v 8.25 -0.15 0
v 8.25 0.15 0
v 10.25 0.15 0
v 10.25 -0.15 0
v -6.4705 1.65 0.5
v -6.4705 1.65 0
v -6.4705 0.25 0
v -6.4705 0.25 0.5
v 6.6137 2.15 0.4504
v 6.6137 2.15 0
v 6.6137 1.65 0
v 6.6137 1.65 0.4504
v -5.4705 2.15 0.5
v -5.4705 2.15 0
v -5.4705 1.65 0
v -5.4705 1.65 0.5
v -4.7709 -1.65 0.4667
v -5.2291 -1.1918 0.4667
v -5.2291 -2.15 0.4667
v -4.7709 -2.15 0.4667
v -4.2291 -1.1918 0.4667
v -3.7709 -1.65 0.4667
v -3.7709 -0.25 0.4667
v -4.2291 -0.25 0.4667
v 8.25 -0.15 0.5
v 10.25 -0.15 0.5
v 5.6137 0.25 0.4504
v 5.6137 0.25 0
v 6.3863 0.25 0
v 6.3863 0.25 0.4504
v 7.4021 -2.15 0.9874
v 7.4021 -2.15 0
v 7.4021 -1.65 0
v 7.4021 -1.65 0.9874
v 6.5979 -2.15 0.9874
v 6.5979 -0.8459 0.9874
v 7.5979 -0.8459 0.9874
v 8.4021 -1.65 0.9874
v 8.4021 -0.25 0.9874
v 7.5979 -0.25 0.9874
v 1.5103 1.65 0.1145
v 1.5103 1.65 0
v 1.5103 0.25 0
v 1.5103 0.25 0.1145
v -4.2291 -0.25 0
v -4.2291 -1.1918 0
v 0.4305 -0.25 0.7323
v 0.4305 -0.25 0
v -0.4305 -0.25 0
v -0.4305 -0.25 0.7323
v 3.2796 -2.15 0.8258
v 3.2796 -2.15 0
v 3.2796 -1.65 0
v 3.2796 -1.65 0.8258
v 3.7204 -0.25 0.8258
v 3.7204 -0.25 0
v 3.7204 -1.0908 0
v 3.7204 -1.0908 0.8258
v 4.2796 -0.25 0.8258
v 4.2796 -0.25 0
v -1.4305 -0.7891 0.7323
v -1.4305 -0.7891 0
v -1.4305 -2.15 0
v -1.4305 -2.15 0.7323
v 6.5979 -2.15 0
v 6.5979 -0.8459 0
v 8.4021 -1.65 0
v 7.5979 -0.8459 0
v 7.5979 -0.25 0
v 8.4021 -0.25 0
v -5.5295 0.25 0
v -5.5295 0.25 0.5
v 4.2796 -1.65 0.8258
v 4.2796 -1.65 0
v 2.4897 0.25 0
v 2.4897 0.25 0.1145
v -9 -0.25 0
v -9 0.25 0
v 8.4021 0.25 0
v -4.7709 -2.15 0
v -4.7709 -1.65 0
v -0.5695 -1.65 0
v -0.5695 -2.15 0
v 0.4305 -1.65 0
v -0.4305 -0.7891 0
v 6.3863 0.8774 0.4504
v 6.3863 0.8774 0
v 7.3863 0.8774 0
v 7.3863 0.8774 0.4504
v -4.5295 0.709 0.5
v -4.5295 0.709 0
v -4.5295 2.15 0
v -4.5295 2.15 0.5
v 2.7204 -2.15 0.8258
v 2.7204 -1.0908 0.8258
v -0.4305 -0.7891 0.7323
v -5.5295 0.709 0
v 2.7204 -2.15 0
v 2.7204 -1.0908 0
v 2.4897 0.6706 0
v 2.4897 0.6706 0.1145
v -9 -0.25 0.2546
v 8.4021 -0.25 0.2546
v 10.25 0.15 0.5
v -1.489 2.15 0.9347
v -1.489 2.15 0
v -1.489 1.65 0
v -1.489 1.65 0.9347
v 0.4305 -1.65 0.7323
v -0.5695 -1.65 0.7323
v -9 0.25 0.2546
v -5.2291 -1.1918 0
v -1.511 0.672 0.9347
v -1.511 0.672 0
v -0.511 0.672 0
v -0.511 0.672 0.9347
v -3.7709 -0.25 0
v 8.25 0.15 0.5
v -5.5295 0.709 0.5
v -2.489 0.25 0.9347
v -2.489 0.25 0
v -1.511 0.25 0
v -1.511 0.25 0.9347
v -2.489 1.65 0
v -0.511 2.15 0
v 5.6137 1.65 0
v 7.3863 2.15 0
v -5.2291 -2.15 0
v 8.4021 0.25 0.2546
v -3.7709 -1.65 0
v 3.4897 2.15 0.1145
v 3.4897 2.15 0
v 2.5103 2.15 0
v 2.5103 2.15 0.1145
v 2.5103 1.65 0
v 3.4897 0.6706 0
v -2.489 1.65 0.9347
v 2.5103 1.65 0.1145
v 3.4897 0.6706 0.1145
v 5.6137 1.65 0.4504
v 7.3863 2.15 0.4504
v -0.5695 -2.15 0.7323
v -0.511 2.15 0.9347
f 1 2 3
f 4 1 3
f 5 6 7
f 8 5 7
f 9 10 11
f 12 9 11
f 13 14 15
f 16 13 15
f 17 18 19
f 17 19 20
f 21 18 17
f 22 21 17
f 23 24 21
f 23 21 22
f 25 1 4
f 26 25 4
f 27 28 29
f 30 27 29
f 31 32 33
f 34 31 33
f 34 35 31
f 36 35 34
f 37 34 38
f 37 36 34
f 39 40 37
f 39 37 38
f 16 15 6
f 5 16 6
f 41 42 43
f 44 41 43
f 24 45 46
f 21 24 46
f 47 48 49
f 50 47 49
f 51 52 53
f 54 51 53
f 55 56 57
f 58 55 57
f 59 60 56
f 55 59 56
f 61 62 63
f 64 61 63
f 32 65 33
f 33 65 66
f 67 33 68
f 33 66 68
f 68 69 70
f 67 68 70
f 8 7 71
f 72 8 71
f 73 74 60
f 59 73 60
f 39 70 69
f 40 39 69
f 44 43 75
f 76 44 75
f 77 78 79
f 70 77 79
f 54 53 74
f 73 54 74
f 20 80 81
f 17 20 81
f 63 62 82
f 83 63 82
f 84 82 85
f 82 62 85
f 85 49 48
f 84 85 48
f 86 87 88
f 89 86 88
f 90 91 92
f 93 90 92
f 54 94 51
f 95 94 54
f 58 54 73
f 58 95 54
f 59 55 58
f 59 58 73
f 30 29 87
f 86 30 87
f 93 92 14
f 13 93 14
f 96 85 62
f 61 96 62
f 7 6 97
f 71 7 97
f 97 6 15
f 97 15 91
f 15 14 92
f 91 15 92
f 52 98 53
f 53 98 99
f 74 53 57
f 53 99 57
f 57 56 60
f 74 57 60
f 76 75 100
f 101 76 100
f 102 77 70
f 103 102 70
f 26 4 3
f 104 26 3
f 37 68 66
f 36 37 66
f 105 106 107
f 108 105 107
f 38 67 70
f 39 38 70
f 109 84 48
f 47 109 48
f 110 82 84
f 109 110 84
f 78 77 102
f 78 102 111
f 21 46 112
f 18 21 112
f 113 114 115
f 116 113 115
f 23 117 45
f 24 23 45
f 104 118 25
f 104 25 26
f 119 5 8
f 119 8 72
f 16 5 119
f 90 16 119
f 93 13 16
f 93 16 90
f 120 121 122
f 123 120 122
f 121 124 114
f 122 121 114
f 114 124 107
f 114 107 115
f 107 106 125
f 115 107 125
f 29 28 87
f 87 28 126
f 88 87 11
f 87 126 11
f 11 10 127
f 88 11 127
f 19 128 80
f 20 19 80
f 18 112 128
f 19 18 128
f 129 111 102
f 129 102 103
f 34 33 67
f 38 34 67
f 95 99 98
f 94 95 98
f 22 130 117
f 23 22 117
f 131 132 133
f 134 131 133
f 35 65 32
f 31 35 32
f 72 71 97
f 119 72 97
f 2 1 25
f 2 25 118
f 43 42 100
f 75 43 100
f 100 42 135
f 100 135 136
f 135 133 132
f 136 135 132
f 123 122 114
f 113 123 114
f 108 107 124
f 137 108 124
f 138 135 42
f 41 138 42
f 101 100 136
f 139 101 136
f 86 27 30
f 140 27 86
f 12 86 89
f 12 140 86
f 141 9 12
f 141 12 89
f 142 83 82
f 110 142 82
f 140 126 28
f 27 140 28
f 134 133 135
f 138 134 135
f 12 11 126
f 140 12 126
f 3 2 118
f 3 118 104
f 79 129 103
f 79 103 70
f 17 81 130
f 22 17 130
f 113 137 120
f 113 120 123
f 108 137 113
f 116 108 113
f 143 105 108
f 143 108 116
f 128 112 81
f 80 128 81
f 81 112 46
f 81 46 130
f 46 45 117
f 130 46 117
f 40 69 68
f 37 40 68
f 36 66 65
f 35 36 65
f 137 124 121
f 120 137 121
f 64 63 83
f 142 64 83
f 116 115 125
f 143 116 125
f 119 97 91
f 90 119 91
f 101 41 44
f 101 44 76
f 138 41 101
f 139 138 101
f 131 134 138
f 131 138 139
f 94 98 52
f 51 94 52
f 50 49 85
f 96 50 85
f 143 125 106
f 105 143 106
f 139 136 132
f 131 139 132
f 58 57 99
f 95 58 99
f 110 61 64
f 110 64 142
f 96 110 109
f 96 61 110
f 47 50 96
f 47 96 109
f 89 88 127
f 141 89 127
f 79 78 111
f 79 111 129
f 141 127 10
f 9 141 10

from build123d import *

# Parameters (mm, degrees)
SKETCH_1_W          = 18
SKETCH_1_H          = 0.5
EXTRUDE_1_DEPTH     = 0.25457
EXTRUDE_3_DEPTH     = 0.5
EXTRUDE_4_DEPTH     = 0.93474
EXTRUDE_5_DEPTH     = 0.11451
EXTRUDE_6_DEPTH     = 0.45035
EXTRUDE_7_DEPTH     = 0.46671
EXTRUDE_8_DEPTH     = 0.73227
EXTRUDE_9_DEPTH     = 0.82582
EXTRUDE_10_DEPTH    = 0.98745
SKETCH_14_W         = 0.25457
SKETCH_14_H         = 0.5
CUT_EXTRUDE_1_DEPTH = 0.59794
SKETCH_15_W         = 2
SKETCH_15_H         = 0.3
EXTRUDE_11_DEPTH    = 0.5


with BuildPart() as part:
    # 草图1 → 凸台-拉伸1 (new body)
    with BuildSketch(Plane.XY):
        Rectangle(SKETCH_1_W, SKETCH_1_H)
    extrude(amount=EXTRUDE_1_DEPTH)

    # 草图14 → 切除-拉伸1 (cut)
    with BuildSketch(Plane(origin=(9, 0, 0), x_dir=(0, 0, -1), z_dir=(1, 0, 0))):
        with Locations((-0.127285, 0)):
            Rectangle(SKETCH_14_W, SKETCH_14_H)
    extrude(amount=-CUT_EXTRUDE_1_DEPTH, mode=Mode.SUBTRACT)


with BuildPart() as body_2:
    # 草图5 → 凸台-拉伸3 (new body)
    with BuildSketch(Plane.XY):
        Polygon((-5.470505, 2.15), (-5.470505, 1.65), (-6.470505, 1.65), (-6.470505, 0.25), (-5.529495, 0.25), (-5.529495, 0.70899), (-4.529495, 0.70899), (-4.529495, 2.15), align=None)
    extrude(amount=EXTRUDE_3_DEPTH)


with BuildPart() as body_3:
    # 草图6 → 凸台-拉伸4 (new body)
    with BuildSketch(Plane.XY):
        Polygon((-1, 2.15), (-1.489025, 2.15), (-1.489025, 1.65), (-2.489025, 1.65), (-2.489025, 0.25), (-1.510975, 0.25), (-1.510975, 0.67195), (-0.510975, 0.67195), (-0.510975, 1.302983854), (-0.510975, 2.15), align=None)
    extrude(amount=EXTRUDE_4_DEPTH)


with BuildPart() as body_4:
    # 草图7 → 凸台-拉伸5 (new body)
    with BuildSketch(Plane.XY):
        Polygon((3, 2.15), (2.51029, 2.15), (2.51029, 1.65), (1.51029, 1.65), (1.51029, 0.25), (2.48971, 0.25), (2.48971, 0.67058), (3.48971, 0.67058), (3.48971, 1.301797399), (3.48971, 2.15), align=None)
    extrude(amount=EXTRUDE_5_DEPTH)


with BuildPart() as body_5:
    # 草图8 → 凸台-拉伸6 (new body)
    with BuildSketch(Plane.XY):
        Polygon((7, 2.15), (6.61371, 2.15), (6.61371, 1.65), (5.61371, 1.65), (5.61371, 0.25), (6.38629, 0.25), (6.38629, 0.87742), (7.38629, 0.87742), (7.38629, 1.480926094), (7.38629, 2.15), align=None)
    extrude(amount=EXTRUDE_6_DEPTH)


with BuildPart() as body_6:
    # 草图9 → 凸台-拉伸7 (new body)
    with BuildSketch(Plane.XY):
        Polygon((-5, -2.15), (-4.770925, -2.15), (-4.770925, -1.65), (-3.770925, -1.65), (-3.770925, -0.25), (-4.229075, -0.25), (-4.229075, -1.19185), (-5.229075, -1.19185), (-5.229075, -2.15), align=None)
    extrude(amount=EXTRUDE_7_DEPTH)


with BuildPart() as body_7:
    # 草图11 → 凸台-拉伸8 (new body)
    with BuildSketch(Plane.XY):
        Polygon((-1, -2.15), (-0.56953, -2.15), (-0.56953, -1.65), (0.43047, -1.65), (0.43047, -0.25), (-0.43047, -0.25), (-0.43047, -0.78906), (-1.43047, -0.78906), (-1.43047, -1.404404089), (-1.43047, -2.15), align=None)
    extrude(amount=EXTRUDE_8_DEPTH)


with BuildPart() as body_8:
    # 草图12 → 凸台-拉伸9 (new body)
    with BuildSketch(Plane.XY):
        Polygon((3, -2.15), (3.279625, -2.15), (3.279625, -1.65), (4.279625, -1.65), (4.279625, -0.25), (3.720375, -0.25), (3.720375, -1.09075), (2.720375, -1.09075), (2.720375, -1.665675293), (2.720375, -2.15), align=None)
    extrude(amount=EXTRUDE_9_DEPTH)


with BuildPart() as body_9:
    # 草图13 → 凸台-拉伸10 (new body)
    with BuildSketch(Plane.XY):
        Polygon((7, -2.15), (7.40206, -2.15), (7.40206, -1.65), (8.40206, -1.65), (8.40206, -0.25), (7.59794, -0.25), (7.59794, -0.84588), (6.59794, -0.84588), (6.59794, -1.453611652), (6.59794, -2.15), align=None)
    extrude(amount=EXTRUDE_10_DEPTH)


with BuildPart() as body_10:
    # 草图15 → 凸台-拉伸11 (new body)
    with BuildSketch(Plane.XY):
        with Locations((9.25, 0)):
            Rectangle(SKETCH_15_W, SKETCH_15_H)
    extrude(amount=EXTRUDE_11_DEPTH)


solid = Compound([part.part, body_2.part, body_3.part, body_4.part, body_5.part, body_6.part, body_7.part, body_8.part, body_9.part, body_10.part])
